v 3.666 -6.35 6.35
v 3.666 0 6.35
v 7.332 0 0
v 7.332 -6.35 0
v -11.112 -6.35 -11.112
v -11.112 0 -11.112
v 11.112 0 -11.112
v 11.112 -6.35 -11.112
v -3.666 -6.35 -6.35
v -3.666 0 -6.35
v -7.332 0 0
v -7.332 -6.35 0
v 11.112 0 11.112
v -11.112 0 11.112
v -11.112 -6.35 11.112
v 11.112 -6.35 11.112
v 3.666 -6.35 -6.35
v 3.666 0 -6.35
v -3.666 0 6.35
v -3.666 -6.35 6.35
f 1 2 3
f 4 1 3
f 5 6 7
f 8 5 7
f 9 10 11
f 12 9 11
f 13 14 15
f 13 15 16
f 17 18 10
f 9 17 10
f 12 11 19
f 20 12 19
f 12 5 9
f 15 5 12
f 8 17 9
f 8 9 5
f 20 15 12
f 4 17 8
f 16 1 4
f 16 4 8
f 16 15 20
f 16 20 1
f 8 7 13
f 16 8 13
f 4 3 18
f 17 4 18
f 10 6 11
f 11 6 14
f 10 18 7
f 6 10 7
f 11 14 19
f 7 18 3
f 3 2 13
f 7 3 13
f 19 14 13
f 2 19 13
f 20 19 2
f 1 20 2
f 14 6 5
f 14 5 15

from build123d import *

# Parameters (mm, degrees)
F0_W     = 22.225
F0_H     = 22.225
F1_DEPTH = 6.35


with BuildPart() as f1:
    # F0 (on Front) → F1 (new body)
    with BuildSketch(Plane.XZ):
        Rectangle(F0_W, F0_H)
        Polygon((-7.332348, 0), (-3.666174, 6.35), (3.666174, 6.35), (7.332348, 0), (3.666174, -6.35), (-3.666174, -6.35), align=None, mode=Mode.SUBTRACT)
    extrude(amount=F1_DEPTH)


solid = f1.part
